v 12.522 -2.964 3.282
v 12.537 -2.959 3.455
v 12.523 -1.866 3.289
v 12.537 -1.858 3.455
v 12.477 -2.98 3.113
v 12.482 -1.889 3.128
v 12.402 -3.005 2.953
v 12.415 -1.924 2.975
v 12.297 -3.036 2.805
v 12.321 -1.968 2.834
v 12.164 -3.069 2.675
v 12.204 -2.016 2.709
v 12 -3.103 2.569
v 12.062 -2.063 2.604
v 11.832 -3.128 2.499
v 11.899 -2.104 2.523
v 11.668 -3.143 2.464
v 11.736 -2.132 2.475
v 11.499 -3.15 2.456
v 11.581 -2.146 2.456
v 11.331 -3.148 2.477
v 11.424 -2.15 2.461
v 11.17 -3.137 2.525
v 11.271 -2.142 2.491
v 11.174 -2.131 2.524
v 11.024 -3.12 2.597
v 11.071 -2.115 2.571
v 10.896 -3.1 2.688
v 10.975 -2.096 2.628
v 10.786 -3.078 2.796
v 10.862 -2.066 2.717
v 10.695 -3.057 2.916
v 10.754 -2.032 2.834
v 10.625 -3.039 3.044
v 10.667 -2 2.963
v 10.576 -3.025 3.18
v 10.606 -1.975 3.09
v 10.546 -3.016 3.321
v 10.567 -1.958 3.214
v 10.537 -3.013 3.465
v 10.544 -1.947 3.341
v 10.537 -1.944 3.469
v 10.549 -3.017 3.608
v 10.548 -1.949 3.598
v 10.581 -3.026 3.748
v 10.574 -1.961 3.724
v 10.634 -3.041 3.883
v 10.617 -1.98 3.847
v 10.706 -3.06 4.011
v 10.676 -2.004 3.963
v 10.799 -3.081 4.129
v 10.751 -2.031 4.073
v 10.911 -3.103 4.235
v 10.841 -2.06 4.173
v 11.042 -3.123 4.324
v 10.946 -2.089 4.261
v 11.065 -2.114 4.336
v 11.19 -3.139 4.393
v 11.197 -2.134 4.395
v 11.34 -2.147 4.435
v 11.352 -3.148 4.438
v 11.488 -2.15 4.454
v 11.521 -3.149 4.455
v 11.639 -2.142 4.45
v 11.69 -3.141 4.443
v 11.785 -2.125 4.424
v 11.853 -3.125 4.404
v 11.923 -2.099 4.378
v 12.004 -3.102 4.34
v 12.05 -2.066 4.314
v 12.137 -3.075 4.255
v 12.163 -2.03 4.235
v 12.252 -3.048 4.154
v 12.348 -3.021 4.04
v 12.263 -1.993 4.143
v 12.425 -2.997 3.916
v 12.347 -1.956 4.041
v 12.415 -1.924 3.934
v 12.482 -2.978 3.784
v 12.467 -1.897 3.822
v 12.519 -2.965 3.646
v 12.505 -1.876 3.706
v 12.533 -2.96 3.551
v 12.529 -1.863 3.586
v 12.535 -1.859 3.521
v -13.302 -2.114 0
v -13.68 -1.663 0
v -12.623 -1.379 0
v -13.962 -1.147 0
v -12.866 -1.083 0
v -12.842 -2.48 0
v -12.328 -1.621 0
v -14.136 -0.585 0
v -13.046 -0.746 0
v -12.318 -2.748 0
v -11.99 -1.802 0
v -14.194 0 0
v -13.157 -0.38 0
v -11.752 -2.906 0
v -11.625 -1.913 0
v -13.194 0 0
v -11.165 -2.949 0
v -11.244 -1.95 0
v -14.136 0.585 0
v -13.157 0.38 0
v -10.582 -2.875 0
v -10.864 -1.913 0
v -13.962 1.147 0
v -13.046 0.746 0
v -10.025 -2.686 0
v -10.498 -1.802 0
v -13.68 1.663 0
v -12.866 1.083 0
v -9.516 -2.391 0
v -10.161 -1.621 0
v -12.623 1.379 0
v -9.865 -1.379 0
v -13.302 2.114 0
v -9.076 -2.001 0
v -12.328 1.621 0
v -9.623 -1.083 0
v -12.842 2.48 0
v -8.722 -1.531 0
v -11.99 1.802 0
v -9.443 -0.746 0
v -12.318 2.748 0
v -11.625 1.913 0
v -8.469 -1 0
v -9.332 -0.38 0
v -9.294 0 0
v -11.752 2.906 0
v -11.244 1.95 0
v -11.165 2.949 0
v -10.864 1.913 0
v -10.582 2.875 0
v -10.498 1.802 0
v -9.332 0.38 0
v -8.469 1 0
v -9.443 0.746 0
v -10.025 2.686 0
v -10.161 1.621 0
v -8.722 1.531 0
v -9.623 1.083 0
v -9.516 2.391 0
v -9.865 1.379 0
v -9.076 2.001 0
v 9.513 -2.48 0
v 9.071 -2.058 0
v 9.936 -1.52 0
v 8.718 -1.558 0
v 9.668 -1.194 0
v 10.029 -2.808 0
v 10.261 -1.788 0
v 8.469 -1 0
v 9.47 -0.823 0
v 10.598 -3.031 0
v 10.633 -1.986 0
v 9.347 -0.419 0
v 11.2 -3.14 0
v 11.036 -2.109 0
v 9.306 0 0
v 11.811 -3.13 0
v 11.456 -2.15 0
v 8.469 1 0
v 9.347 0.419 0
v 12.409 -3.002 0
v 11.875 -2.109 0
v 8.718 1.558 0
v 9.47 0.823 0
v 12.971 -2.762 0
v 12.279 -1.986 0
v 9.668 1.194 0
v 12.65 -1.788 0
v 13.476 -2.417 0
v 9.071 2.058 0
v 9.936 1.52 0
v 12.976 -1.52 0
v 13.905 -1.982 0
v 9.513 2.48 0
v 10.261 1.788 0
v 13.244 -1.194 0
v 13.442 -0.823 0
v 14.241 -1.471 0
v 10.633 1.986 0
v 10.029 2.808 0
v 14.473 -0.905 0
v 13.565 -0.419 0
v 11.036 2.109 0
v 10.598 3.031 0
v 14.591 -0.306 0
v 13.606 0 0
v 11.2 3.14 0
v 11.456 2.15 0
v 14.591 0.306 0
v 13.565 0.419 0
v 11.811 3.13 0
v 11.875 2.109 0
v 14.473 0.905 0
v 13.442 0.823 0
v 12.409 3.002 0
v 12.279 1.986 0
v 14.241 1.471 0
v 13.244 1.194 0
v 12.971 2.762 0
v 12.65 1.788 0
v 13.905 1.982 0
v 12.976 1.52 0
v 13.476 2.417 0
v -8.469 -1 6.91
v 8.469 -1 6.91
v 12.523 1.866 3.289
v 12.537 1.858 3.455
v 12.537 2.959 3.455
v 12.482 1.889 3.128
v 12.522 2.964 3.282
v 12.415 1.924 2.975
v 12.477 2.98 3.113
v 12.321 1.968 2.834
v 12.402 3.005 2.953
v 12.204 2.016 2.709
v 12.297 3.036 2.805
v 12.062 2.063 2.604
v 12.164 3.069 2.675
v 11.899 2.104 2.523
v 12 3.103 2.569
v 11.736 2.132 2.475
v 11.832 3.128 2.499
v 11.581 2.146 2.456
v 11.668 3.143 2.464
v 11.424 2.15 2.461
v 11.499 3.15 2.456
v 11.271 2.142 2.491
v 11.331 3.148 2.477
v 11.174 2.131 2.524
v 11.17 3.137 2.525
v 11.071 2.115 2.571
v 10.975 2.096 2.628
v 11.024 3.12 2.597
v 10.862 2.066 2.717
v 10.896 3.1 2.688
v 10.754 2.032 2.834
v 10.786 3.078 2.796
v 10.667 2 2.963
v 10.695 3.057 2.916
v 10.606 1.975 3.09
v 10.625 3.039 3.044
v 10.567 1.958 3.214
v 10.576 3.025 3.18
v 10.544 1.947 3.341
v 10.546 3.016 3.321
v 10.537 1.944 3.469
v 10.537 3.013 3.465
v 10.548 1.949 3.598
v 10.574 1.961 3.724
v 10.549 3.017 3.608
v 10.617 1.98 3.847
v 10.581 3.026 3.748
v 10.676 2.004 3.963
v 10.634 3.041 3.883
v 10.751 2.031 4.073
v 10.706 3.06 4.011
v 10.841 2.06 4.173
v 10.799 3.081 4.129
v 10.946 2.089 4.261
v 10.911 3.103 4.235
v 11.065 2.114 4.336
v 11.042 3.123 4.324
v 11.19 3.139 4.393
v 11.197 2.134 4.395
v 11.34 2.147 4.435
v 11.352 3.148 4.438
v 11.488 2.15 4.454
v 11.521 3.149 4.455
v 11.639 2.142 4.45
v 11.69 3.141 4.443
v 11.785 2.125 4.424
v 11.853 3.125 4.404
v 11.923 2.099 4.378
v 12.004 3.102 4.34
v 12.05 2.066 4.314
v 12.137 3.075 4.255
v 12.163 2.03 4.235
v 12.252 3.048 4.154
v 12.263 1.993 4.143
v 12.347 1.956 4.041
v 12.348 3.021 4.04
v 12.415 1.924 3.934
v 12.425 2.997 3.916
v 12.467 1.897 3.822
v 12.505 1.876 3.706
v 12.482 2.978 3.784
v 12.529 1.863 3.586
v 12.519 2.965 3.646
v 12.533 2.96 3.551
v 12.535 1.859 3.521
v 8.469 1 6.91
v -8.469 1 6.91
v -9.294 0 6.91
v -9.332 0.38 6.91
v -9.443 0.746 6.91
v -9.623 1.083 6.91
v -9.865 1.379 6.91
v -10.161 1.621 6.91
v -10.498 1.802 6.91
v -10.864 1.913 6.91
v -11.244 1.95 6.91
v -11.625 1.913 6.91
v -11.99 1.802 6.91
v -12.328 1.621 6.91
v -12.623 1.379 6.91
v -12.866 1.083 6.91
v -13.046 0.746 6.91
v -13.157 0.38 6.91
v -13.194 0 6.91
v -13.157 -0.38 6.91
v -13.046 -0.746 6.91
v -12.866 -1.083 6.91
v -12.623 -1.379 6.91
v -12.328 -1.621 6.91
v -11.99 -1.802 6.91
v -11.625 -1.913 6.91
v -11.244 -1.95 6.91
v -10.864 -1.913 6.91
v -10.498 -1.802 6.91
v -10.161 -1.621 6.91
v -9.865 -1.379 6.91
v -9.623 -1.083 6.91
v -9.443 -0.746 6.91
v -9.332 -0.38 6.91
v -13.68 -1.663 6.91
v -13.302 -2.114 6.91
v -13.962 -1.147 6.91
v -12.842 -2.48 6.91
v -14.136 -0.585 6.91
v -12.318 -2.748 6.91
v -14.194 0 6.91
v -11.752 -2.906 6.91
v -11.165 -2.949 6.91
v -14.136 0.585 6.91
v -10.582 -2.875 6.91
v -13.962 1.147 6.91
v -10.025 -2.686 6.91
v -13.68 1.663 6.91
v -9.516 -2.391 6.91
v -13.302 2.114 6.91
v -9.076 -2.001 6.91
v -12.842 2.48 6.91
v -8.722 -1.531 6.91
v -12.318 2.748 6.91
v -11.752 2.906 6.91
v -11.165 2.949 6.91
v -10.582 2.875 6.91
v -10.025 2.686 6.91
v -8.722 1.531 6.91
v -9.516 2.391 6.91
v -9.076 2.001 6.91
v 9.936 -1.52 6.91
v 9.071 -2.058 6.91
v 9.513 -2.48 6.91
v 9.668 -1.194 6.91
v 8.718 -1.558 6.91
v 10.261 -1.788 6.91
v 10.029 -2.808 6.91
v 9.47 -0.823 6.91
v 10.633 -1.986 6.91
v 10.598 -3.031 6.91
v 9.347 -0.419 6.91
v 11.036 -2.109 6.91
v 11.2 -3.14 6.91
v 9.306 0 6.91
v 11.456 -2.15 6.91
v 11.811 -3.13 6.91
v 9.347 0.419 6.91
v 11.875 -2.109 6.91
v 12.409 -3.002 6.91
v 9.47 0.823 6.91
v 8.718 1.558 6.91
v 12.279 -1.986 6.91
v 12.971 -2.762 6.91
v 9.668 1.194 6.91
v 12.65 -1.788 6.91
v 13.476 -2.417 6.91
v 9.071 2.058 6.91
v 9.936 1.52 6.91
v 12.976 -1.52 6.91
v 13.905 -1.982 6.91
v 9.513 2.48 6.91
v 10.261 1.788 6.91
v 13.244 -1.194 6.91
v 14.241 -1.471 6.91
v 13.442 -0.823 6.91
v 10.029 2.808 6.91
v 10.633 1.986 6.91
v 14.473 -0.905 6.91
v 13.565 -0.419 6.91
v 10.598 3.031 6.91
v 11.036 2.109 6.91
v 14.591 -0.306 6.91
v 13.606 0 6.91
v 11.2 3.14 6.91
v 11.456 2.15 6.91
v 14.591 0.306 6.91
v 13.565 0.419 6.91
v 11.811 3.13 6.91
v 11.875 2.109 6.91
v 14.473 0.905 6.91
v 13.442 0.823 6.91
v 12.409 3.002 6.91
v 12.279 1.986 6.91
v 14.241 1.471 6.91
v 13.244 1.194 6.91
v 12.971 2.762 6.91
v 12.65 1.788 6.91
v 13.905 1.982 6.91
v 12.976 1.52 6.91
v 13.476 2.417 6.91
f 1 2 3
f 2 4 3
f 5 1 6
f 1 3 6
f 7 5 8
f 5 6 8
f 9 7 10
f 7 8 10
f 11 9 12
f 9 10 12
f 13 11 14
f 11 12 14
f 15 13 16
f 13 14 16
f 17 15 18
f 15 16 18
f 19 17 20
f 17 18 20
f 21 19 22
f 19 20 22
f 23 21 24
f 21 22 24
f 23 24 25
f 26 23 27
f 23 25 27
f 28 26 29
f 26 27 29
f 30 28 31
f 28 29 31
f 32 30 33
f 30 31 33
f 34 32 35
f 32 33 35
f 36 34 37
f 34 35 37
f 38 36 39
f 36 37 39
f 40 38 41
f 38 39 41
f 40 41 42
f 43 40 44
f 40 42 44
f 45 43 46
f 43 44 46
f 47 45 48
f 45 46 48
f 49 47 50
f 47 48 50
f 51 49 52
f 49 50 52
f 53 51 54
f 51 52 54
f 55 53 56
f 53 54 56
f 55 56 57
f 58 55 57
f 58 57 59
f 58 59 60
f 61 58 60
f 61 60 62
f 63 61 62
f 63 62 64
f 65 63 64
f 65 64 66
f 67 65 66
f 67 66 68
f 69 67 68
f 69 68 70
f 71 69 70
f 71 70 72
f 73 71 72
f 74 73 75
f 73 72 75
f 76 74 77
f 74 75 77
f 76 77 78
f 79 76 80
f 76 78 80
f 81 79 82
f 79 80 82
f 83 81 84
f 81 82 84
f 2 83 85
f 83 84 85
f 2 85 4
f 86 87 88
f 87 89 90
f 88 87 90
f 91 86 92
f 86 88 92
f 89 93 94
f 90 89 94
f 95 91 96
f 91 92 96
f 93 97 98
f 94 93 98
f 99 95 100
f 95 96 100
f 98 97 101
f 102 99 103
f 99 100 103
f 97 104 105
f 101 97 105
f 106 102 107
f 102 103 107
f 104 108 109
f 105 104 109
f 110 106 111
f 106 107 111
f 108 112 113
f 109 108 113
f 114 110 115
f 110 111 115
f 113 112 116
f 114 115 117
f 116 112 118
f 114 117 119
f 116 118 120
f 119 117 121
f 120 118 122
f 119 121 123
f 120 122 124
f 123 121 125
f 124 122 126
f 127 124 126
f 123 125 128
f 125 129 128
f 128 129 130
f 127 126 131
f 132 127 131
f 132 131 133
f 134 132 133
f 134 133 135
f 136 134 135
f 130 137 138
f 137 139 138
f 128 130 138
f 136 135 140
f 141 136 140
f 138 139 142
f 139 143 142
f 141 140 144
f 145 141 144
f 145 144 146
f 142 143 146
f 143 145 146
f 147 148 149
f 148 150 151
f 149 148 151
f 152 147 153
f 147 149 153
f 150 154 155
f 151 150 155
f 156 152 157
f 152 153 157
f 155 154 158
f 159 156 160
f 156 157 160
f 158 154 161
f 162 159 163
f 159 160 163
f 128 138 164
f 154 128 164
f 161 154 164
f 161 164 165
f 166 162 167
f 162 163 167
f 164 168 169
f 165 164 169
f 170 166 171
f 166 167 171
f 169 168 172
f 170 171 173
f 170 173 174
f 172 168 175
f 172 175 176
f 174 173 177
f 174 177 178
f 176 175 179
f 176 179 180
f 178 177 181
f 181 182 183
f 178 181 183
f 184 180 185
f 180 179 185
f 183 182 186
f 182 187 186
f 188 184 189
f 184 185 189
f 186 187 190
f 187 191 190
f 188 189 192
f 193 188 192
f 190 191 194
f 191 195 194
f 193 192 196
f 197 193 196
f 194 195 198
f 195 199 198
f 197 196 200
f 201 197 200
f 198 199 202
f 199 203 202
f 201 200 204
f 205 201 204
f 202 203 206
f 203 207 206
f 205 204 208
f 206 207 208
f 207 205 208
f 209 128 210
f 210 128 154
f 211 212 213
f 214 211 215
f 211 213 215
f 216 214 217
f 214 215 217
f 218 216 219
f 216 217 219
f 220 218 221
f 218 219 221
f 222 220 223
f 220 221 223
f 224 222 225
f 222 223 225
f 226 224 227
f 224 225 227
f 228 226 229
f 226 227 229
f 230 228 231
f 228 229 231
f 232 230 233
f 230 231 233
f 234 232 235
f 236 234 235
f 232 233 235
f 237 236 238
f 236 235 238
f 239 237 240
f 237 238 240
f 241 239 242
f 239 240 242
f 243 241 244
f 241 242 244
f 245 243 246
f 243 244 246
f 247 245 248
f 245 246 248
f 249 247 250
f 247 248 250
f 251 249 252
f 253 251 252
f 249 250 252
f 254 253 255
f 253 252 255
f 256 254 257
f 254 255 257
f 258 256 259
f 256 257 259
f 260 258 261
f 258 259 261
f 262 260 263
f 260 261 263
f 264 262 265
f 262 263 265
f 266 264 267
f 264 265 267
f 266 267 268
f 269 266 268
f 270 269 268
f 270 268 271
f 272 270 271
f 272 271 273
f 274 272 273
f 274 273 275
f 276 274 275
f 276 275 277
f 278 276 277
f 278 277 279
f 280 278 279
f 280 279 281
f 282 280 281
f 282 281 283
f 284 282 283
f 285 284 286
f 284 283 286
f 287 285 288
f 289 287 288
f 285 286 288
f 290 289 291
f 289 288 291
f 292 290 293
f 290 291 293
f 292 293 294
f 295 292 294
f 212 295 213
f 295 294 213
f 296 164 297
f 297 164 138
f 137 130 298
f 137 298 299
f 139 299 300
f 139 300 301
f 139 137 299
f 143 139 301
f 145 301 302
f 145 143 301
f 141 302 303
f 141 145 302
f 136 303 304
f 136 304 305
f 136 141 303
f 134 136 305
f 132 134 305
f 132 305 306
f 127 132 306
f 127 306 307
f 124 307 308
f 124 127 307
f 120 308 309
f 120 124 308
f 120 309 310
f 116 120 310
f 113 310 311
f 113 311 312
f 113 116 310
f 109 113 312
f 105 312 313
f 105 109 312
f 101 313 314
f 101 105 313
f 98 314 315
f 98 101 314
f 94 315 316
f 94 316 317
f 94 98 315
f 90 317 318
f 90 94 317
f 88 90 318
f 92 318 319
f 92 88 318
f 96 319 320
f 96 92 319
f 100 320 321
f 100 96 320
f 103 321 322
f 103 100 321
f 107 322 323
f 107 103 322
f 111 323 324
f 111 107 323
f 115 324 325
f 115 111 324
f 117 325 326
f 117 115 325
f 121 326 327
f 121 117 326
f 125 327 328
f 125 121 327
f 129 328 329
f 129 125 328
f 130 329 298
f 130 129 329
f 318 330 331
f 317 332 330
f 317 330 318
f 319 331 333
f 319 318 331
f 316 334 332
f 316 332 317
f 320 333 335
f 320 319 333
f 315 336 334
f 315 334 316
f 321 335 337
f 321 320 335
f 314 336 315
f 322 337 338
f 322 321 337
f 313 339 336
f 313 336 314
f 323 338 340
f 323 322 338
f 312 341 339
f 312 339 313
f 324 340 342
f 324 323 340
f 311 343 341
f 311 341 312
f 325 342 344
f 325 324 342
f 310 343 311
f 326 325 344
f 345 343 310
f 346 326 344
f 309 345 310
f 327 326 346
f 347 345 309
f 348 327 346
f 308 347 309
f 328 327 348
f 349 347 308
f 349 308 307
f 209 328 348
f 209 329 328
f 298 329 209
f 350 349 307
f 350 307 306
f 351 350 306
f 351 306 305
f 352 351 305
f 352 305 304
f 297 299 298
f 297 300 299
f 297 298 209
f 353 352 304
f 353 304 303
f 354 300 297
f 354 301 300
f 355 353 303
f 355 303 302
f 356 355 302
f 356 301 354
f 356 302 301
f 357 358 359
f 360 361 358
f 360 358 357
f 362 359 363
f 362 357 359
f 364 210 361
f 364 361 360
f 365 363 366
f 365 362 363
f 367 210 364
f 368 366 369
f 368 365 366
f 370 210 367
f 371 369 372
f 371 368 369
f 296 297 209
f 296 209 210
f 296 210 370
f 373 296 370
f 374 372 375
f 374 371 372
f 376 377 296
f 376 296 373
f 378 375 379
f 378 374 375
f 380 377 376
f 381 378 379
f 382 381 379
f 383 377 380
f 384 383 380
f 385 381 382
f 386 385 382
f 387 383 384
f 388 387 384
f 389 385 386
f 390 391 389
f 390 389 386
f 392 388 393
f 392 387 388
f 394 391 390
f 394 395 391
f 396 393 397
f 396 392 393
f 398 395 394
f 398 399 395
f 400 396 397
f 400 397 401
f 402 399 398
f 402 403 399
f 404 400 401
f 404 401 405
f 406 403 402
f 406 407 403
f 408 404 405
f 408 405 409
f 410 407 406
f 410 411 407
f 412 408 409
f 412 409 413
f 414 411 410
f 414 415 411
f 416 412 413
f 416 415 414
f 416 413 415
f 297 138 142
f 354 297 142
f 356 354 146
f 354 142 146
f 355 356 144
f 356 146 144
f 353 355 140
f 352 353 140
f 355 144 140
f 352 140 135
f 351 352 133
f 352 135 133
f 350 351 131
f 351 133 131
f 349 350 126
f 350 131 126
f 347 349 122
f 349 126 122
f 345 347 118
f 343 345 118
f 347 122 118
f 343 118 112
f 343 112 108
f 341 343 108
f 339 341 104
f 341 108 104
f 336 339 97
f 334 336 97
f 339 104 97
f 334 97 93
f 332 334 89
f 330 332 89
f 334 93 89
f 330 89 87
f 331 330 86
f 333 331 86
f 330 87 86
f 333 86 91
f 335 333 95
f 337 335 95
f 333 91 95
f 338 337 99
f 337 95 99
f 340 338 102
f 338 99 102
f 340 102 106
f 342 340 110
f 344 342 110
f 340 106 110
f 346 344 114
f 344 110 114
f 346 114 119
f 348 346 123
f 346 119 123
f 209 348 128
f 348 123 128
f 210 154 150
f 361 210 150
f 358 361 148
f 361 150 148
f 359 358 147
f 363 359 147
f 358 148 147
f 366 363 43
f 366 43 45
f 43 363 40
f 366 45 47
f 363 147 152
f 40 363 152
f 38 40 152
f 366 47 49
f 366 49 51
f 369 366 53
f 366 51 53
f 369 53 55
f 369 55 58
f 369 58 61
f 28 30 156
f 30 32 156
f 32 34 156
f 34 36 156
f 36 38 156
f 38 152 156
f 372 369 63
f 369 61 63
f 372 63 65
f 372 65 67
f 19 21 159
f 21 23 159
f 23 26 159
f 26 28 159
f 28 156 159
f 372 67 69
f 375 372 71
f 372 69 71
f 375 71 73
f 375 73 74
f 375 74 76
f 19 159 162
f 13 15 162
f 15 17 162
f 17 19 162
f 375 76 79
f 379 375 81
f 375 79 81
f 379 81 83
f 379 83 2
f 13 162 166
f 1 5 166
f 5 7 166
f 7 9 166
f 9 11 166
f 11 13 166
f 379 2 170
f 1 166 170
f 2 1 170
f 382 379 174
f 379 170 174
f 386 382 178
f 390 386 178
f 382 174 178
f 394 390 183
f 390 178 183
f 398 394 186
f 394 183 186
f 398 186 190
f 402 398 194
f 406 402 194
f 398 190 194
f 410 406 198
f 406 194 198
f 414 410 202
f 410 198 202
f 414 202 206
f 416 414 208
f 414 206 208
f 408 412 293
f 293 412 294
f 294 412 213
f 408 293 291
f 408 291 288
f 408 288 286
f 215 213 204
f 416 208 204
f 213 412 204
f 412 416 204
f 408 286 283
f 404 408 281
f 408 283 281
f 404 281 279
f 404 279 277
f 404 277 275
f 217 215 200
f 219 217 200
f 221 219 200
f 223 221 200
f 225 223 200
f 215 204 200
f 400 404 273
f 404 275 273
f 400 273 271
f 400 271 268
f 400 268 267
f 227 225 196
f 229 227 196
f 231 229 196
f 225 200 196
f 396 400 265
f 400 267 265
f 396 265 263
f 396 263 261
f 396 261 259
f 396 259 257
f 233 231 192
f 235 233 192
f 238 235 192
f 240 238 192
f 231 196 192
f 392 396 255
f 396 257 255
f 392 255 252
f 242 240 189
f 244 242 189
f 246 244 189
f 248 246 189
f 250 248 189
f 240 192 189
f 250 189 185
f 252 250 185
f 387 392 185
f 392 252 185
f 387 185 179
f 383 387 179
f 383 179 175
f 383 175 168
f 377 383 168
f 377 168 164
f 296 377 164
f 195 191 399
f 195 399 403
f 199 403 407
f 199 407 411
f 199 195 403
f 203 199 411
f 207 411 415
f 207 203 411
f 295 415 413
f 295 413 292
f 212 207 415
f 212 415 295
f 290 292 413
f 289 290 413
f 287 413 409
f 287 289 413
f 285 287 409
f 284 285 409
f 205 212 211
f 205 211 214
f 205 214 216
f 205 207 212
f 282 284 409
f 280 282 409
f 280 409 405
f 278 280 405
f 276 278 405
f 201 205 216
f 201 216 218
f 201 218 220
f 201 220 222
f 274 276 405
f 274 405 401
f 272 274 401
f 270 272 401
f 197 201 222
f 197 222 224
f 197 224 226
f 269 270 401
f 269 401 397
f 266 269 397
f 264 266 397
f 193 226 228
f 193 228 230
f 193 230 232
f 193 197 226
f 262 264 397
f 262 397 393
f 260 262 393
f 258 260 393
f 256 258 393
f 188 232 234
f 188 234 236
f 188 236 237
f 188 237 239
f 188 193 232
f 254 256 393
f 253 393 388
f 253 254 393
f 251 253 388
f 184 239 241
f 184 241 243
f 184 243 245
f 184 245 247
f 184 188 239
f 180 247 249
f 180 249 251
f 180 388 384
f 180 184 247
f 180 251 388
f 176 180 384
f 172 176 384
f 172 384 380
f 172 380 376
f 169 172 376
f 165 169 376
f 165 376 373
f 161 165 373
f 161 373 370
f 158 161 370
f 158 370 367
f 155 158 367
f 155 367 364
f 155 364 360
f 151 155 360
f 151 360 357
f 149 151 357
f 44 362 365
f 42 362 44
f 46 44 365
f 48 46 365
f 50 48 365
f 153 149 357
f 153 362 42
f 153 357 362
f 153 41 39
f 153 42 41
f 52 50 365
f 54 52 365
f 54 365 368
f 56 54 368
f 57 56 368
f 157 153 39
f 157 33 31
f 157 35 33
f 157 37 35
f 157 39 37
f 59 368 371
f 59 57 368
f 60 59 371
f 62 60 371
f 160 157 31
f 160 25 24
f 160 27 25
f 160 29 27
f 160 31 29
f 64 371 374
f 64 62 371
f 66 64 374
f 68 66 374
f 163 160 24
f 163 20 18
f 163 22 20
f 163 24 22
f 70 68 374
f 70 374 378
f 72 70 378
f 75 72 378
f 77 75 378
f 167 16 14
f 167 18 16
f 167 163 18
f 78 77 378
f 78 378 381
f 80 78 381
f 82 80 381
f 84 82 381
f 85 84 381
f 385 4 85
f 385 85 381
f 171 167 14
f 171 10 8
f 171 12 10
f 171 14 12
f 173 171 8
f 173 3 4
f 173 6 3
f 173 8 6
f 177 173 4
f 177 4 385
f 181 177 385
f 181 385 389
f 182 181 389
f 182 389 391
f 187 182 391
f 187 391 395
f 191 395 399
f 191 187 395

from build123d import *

# Parameters (mm, degrees)
SKETCH1_R         = 1.95
SKETCH1_R_2       = 2.15
MAIN_BODY_DEPTH   = 6.91
SKETCH2_R         = 1
TENDON_HOLE_DEPTH = 7.5


with BuildPart() as part:
    # Sketch1 → main body (new body)
    with BuildSketch(Plane.XY):
        with BuildLine():
            Line((8.468803388, 1), (-8.468803388, 1))
            ThreePointArc((-8.468803388, 1), (-14.194141206, 0), (-8.468803388, -1))
            Line((-8.468803388, -1), (8.468803388, -1))
            ThreePointArc((8.468803388, -1), (14.605858794, 0), (8.468803388, 1))
        make_face()
        with Locations((-11.244141206, 0)):
            Circle(SKETCH1_R, mode=Mode.SUBTRACT)
        with Locations((11.455858794, 0)):
            Circle(SKETCH1_R_2, mode=Mode.SUBTRACT)
    extrude(amount=MAIN_BODY_DEPTH)

    # Sketch2 → tendon hole (cut, symmetric)
    with BuildSketch(Plane(origin=(0, 1, 0), x_dir=(1, 0, 0), z_dir=(0, 1, 0))):
        with Locations((11.537331091, -3.455)):
            Circle(SKETCH2_R)
    extrude(amount=TENDON_HOLE_DEPTH, both=True, mode=Mode.SUBTRACT)


solid = part.part
